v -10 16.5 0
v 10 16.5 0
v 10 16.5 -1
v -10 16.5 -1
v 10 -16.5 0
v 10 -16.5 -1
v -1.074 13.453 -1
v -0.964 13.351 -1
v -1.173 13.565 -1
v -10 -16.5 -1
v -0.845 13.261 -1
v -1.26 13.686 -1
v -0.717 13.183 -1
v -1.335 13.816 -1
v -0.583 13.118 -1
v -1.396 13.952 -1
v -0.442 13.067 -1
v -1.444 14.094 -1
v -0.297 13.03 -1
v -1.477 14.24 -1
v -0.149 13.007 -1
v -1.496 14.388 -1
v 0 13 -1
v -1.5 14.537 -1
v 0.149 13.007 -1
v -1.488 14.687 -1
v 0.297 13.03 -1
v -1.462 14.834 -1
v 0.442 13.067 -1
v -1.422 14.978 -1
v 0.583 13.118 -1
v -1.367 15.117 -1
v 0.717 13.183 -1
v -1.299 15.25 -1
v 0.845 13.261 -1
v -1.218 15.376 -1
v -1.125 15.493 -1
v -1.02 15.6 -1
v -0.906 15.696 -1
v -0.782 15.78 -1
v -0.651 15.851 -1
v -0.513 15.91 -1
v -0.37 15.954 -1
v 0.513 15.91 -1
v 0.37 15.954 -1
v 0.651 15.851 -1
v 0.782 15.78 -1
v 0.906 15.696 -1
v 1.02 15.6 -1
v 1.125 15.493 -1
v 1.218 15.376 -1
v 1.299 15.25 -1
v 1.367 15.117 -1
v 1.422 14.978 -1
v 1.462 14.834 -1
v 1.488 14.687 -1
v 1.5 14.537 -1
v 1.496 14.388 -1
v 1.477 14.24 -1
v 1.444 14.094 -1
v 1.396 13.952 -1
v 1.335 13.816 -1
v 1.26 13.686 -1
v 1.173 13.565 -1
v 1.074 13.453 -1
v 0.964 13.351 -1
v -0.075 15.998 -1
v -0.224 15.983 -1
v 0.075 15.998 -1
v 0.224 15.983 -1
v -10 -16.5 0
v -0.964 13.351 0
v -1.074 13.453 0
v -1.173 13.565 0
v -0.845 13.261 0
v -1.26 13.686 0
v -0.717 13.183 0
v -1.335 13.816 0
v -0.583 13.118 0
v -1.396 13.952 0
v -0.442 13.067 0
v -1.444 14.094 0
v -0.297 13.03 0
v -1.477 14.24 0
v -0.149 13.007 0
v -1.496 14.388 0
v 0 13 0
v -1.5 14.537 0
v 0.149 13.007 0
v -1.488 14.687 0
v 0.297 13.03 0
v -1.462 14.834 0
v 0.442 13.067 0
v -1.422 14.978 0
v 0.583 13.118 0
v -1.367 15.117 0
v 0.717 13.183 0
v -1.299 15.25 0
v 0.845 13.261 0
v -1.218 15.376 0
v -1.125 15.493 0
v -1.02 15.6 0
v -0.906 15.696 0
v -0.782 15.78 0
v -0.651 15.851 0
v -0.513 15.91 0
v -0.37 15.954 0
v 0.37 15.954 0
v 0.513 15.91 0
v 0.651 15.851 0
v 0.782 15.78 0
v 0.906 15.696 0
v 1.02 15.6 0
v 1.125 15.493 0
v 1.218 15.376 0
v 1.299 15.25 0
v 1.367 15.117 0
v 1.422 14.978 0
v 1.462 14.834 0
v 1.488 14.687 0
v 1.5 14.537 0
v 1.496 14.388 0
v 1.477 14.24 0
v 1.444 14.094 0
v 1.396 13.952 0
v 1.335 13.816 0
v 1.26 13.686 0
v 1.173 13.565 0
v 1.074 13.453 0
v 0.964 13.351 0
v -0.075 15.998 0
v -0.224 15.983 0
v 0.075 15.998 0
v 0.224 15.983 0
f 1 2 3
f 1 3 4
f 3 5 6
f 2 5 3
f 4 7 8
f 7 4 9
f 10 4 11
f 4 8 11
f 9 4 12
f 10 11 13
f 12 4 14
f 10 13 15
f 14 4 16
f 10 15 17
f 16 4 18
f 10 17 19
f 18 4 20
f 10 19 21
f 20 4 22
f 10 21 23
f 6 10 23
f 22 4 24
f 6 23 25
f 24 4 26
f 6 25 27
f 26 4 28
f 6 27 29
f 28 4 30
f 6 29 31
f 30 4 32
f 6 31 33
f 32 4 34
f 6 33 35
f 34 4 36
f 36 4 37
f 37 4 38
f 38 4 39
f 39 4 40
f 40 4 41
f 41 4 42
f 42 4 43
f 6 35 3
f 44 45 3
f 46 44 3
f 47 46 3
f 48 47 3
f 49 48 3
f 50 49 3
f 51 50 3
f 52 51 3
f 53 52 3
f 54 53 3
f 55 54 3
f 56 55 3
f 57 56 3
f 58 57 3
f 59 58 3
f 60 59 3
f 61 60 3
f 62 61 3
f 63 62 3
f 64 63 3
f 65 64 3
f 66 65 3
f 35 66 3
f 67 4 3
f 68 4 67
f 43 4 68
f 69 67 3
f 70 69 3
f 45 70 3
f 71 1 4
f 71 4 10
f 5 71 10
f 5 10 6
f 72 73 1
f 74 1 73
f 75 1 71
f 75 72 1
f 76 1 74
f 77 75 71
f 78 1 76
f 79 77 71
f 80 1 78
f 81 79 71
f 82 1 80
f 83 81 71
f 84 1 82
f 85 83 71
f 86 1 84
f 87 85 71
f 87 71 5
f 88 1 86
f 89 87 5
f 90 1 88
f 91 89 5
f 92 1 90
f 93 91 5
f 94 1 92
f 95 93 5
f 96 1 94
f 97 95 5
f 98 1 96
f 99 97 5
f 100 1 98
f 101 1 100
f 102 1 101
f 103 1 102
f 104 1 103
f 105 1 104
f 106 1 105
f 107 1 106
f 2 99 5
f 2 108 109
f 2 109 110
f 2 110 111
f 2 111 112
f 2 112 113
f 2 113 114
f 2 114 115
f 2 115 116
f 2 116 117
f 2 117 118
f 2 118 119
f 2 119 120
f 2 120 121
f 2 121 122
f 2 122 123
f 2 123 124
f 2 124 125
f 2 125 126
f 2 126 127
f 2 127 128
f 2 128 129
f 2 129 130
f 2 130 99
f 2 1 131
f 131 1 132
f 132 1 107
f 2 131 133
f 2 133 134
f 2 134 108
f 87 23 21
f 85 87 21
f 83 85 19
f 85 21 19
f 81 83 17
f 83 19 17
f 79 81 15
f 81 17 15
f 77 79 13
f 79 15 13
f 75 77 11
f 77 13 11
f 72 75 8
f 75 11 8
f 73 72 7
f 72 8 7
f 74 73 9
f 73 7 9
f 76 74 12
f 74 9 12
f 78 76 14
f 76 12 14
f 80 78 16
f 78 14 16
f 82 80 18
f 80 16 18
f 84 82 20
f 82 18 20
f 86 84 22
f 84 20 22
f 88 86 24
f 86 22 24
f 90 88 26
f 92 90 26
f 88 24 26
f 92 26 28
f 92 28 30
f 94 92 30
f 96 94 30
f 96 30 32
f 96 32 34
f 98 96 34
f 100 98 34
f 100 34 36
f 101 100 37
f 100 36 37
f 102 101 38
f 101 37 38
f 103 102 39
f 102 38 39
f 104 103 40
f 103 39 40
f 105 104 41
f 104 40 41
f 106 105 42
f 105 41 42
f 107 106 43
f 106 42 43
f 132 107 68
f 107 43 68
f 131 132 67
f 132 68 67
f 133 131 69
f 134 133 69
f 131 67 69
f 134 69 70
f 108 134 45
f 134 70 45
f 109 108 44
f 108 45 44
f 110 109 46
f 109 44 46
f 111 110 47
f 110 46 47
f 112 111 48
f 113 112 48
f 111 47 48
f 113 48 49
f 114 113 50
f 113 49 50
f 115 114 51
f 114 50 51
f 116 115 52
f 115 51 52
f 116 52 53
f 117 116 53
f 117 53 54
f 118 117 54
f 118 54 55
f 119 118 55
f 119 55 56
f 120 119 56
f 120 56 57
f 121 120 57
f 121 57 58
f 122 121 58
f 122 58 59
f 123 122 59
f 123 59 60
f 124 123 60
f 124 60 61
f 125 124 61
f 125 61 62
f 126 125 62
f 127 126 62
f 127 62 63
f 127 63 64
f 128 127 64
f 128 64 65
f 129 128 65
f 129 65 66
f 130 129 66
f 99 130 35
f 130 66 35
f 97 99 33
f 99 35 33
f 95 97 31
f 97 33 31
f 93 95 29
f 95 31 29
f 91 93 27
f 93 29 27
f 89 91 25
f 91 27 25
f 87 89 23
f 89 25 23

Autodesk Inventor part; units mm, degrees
ref_plane "YZ Plane" through (0, 0, 0) normal (1, 0, 0) x (0, 1, 0)
ref_plane "XZ Plane" through (0, 0, 0) normal (0, 1, 0) x (-1, 0, 0)
ref_plane "XY Plane" through (0, 0, 0) normal (0, 0, 1) x (1, 0, 0)
sketch "Sketch1" plane through (0, 0, 0) normal (0, 0, 1) x (1, 0, 0)
  line L0 (-10, -16.5) -> (10, -16.5)
  line L1 (10, -16.5) -> (10, 16.5)
  line L2 (10, 16.5) -> (-10, 16.5)
  line L3 (-10, 16.5) -> (-10, -16.5)
  line L4 (-10, -16.5) -> (10, 16.5) construction
  line L5 (10, -16.5) -> (-10, 16.5) construction
  line L6 (0, 16.5) -> (0, -16.5)
  line L7 (-10, 0) -> (10, 0)
  circle A0 centre (0, 14.5) radius 1.5
  line L8 (-10, 14.5) -> (10, 14.5) construction
  line L9 (10, 14.5) -> (-10, 14.5) construction
  point P0 (0, 0)
  point P1 (-8, 14.5)
  point P2 (-4, 14.5)
  point P3 (8, 14.5)
  point P4 (4, 14.5)
  point P5 (7, -3.5)
  dimension "d0" = 20
  dimension "d1" = 33
  dimension "d2" = 3
  dimension "d3" = 2
  dimension "d4" = 2
  dimension "d5" = 6
  dimension "d6" = 2
  dimension "d7" = 20
  dimension "d8" = 3
extrude "Extrusion1" add sketch "Sketch1" against normal blind 1
hole "Hole1" at (0, 14.5, 0) direction (0, 0, -1) diameter 3 end through all
properties part number "ShellyUni"
